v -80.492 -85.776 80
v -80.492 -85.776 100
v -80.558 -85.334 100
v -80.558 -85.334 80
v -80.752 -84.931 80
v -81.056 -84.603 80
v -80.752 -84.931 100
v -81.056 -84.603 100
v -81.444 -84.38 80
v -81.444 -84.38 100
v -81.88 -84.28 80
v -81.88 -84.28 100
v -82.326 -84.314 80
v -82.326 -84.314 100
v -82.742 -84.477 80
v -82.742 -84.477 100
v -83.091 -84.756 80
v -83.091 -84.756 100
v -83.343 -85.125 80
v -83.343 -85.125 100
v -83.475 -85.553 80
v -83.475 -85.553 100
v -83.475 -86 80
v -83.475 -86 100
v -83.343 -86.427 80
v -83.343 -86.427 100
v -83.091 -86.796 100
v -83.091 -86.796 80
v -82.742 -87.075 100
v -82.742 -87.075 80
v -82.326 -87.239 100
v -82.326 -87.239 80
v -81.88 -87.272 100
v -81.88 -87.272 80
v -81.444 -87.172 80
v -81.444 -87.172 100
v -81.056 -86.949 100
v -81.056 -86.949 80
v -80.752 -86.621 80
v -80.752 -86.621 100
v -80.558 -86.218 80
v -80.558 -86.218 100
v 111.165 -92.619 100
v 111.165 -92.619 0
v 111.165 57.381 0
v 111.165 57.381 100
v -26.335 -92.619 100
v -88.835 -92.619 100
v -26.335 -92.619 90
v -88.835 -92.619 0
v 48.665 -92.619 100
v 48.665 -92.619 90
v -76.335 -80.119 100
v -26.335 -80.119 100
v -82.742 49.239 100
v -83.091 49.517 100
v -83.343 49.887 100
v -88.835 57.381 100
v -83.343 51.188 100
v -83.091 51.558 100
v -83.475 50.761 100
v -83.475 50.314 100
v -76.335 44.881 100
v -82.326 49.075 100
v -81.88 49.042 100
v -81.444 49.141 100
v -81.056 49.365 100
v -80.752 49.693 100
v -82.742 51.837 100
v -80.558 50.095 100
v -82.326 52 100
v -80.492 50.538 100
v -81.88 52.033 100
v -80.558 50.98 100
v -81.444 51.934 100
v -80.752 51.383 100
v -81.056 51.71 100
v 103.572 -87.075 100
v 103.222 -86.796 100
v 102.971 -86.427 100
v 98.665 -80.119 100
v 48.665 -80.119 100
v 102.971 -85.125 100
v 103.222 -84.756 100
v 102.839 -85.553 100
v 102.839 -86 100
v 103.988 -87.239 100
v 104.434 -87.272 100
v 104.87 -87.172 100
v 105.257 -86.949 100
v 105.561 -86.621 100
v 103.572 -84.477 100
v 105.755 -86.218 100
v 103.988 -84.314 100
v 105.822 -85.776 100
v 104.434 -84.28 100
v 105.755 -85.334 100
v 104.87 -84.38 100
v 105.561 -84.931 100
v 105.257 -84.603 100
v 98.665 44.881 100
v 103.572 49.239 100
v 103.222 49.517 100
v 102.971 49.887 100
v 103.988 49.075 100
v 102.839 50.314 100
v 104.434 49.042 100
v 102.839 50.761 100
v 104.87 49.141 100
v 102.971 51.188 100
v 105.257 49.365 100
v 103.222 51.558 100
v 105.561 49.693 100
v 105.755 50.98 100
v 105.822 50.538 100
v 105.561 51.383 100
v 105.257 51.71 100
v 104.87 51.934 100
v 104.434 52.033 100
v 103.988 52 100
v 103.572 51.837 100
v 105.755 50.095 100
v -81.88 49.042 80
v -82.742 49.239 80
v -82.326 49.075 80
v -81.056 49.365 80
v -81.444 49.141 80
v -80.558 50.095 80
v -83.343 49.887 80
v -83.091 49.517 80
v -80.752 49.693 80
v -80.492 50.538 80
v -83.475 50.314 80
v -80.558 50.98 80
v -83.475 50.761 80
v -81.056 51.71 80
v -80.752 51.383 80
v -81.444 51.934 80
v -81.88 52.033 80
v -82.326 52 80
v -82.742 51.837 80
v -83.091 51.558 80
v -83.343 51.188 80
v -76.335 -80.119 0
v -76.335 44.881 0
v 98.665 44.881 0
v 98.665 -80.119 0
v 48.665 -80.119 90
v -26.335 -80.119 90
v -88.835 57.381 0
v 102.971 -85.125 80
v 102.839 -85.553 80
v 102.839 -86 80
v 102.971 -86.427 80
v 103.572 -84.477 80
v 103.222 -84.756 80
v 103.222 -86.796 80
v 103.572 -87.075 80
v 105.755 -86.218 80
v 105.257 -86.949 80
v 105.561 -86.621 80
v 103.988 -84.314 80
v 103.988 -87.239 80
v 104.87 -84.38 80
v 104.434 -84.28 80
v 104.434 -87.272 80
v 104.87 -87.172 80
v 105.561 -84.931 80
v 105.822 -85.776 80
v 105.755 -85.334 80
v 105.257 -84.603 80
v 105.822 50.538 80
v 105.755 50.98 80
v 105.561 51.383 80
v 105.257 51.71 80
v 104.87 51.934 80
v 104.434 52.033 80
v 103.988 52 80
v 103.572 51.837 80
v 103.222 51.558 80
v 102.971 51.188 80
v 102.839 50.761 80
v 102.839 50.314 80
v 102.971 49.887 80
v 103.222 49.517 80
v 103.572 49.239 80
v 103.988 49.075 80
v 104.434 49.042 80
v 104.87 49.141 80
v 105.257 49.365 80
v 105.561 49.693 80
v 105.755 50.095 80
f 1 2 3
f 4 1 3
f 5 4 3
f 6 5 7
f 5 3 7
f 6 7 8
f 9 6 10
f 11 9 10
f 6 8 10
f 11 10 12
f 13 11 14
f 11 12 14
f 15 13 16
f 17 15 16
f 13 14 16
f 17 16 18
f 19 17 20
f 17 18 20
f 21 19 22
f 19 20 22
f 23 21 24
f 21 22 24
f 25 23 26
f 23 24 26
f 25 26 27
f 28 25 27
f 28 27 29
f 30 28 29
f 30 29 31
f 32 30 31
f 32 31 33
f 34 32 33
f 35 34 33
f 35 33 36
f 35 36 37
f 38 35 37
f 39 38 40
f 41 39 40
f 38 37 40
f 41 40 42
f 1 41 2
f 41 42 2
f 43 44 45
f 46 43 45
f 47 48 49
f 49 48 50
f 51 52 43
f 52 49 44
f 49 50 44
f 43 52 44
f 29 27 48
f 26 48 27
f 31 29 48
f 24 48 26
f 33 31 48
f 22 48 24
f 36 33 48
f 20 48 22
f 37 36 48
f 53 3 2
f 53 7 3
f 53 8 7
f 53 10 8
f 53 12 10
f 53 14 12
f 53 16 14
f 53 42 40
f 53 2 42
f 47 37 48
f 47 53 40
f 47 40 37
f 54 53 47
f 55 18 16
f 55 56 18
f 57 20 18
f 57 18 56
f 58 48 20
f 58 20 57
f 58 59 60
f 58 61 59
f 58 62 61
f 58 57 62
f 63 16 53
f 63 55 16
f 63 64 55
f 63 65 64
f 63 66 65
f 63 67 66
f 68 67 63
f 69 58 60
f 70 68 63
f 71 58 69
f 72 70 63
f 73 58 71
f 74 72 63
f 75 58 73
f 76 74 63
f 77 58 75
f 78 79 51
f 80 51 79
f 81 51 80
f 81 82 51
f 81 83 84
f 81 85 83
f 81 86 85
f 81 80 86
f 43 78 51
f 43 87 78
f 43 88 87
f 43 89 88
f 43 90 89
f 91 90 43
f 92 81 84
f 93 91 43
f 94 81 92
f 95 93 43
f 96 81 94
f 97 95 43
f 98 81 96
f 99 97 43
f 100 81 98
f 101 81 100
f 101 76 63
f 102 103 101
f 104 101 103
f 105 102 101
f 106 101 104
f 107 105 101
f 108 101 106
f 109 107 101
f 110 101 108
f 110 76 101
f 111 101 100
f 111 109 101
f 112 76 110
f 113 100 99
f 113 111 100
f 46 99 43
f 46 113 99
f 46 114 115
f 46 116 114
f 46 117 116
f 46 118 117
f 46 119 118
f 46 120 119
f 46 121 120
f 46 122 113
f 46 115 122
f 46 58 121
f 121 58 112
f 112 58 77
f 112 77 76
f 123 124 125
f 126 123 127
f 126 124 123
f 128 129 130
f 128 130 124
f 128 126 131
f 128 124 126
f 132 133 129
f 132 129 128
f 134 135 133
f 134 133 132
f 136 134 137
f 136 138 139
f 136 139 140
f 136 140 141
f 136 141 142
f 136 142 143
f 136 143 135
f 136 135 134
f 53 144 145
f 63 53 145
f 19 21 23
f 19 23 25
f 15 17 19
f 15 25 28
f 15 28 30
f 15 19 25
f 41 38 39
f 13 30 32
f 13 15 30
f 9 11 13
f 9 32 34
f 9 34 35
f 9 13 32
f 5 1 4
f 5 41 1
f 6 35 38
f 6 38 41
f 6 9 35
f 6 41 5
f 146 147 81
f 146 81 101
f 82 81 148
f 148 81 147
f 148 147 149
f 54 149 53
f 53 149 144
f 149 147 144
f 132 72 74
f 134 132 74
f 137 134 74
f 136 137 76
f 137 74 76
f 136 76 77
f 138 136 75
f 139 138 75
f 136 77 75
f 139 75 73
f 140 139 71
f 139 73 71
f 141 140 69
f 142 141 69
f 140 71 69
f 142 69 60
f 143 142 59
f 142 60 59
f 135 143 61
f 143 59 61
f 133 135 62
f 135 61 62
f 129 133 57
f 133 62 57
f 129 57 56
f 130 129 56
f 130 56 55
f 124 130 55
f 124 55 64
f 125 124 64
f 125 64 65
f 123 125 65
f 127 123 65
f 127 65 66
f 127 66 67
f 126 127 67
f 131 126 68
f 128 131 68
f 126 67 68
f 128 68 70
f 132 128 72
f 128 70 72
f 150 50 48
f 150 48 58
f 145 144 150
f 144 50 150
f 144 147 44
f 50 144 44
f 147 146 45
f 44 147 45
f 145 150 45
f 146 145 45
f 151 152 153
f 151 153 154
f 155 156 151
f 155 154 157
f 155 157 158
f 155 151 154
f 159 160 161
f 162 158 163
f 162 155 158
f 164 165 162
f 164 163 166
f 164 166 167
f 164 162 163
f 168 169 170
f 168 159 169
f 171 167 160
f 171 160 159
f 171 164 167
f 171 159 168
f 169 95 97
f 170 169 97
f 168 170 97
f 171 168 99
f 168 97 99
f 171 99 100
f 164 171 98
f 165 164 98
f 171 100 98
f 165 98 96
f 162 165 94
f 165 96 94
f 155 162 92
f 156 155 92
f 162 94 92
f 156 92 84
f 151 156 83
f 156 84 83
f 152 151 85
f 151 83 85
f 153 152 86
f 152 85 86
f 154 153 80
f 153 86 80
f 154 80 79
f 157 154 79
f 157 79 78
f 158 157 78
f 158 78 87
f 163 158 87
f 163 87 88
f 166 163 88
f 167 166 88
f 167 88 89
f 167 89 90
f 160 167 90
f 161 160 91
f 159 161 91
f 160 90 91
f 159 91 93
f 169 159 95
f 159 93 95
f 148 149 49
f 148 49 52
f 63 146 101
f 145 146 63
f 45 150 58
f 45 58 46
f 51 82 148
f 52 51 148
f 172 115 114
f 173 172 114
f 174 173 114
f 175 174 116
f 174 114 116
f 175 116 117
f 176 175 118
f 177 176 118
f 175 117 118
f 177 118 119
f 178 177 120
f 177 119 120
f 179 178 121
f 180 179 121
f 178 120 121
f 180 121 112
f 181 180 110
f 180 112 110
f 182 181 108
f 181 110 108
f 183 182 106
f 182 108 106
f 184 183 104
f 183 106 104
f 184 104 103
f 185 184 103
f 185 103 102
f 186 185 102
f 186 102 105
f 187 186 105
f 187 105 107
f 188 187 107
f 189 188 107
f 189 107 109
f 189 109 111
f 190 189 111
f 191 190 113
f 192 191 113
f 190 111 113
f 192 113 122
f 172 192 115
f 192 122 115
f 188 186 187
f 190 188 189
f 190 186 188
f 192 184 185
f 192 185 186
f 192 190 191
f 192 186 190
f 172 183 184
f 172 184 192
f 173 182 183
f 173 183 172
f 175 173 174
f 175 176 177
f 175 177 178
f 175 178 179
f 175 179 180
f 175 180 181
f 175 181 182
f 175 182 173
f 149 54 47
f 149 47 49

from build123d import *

# Parameters (mm, degrees)
SKETCH1_W           = 200
SKETCH1_H           = 150
BOSS_EXTRUDE1_DEPTH = 100
SKETCH2_W           = 175
SKETCH2_H           = 125
CUT_EXTRUDE1_DEPTH  = 100
SKETCH3_W           = 75
SKETCH3_H           = 10
CUT_EXTRUDE2_DEPTH  = 15
SKETCH4_R           = 1.5
CUT_EXTRUDE3_DEPTH  = 20


with BuildPart() as part:
    # Sketch1 → Boss-Extrude1 (new body)
    with BuildSketch(Plane.XY):
        with Locations((11.165128543, -17.619294273)):
            Rectangle(SKETCH1_W, SKETCH1_H)
    extrude(amount=BOSS_EXTRUDE1_DEPTH)

    # Sketch2 → Cut-Extrude1 (cut)
    with BuildSketch(Plane(origin=(0, 0, 0), x_dir=(-1, 0, 0), z_dir=(0, 0, -1))):
        with Locations((-11.165128543, -17.619294273)):
            Rectangle(SKETCH2_W, SKETCH2_H)
    extrude(amount=-CUT_EXTRUDE1_DEPTH, mode=Mode.SUBTRACT)

    # Sketch3 → Cut-Extrude2 (cut)
    with BuildSketch(Plane(origin=(0, -80.119294273, 0), x_dir=(1, 0, 0), z_dir=(0, 1, 0))):
        with Locations((11.165128543, -95)):
            Rectangle(SKETCH3_W, SKETCH3_H)
    extrude(amount=-CUT_EXTRUDE2_DEPTH, mode=Mode.SUBTRACT)

    # Sketch4 → Cut-Extrude3 (cut)
    with BuildSketch(Plane.XY.offset(100)):
        with Locations((-81.991725706, 50.537559977)):
            Circle(SKETCH4_R)
        with Locations((-81.991725706, -85.776148522)):
            Circle(SKETCH4_R)
        with Locations((104.321982793, 50.537559977)):
            Circle(SKETCH4_R)
        with Locations((104.321982793, -85.776148522)):
            Circle(SKETCH4_R)
    extrude(amount=-CUT_EXTRUDE3_DEPTH, mode=Mode.SUBTRACT)


solid = part.part
